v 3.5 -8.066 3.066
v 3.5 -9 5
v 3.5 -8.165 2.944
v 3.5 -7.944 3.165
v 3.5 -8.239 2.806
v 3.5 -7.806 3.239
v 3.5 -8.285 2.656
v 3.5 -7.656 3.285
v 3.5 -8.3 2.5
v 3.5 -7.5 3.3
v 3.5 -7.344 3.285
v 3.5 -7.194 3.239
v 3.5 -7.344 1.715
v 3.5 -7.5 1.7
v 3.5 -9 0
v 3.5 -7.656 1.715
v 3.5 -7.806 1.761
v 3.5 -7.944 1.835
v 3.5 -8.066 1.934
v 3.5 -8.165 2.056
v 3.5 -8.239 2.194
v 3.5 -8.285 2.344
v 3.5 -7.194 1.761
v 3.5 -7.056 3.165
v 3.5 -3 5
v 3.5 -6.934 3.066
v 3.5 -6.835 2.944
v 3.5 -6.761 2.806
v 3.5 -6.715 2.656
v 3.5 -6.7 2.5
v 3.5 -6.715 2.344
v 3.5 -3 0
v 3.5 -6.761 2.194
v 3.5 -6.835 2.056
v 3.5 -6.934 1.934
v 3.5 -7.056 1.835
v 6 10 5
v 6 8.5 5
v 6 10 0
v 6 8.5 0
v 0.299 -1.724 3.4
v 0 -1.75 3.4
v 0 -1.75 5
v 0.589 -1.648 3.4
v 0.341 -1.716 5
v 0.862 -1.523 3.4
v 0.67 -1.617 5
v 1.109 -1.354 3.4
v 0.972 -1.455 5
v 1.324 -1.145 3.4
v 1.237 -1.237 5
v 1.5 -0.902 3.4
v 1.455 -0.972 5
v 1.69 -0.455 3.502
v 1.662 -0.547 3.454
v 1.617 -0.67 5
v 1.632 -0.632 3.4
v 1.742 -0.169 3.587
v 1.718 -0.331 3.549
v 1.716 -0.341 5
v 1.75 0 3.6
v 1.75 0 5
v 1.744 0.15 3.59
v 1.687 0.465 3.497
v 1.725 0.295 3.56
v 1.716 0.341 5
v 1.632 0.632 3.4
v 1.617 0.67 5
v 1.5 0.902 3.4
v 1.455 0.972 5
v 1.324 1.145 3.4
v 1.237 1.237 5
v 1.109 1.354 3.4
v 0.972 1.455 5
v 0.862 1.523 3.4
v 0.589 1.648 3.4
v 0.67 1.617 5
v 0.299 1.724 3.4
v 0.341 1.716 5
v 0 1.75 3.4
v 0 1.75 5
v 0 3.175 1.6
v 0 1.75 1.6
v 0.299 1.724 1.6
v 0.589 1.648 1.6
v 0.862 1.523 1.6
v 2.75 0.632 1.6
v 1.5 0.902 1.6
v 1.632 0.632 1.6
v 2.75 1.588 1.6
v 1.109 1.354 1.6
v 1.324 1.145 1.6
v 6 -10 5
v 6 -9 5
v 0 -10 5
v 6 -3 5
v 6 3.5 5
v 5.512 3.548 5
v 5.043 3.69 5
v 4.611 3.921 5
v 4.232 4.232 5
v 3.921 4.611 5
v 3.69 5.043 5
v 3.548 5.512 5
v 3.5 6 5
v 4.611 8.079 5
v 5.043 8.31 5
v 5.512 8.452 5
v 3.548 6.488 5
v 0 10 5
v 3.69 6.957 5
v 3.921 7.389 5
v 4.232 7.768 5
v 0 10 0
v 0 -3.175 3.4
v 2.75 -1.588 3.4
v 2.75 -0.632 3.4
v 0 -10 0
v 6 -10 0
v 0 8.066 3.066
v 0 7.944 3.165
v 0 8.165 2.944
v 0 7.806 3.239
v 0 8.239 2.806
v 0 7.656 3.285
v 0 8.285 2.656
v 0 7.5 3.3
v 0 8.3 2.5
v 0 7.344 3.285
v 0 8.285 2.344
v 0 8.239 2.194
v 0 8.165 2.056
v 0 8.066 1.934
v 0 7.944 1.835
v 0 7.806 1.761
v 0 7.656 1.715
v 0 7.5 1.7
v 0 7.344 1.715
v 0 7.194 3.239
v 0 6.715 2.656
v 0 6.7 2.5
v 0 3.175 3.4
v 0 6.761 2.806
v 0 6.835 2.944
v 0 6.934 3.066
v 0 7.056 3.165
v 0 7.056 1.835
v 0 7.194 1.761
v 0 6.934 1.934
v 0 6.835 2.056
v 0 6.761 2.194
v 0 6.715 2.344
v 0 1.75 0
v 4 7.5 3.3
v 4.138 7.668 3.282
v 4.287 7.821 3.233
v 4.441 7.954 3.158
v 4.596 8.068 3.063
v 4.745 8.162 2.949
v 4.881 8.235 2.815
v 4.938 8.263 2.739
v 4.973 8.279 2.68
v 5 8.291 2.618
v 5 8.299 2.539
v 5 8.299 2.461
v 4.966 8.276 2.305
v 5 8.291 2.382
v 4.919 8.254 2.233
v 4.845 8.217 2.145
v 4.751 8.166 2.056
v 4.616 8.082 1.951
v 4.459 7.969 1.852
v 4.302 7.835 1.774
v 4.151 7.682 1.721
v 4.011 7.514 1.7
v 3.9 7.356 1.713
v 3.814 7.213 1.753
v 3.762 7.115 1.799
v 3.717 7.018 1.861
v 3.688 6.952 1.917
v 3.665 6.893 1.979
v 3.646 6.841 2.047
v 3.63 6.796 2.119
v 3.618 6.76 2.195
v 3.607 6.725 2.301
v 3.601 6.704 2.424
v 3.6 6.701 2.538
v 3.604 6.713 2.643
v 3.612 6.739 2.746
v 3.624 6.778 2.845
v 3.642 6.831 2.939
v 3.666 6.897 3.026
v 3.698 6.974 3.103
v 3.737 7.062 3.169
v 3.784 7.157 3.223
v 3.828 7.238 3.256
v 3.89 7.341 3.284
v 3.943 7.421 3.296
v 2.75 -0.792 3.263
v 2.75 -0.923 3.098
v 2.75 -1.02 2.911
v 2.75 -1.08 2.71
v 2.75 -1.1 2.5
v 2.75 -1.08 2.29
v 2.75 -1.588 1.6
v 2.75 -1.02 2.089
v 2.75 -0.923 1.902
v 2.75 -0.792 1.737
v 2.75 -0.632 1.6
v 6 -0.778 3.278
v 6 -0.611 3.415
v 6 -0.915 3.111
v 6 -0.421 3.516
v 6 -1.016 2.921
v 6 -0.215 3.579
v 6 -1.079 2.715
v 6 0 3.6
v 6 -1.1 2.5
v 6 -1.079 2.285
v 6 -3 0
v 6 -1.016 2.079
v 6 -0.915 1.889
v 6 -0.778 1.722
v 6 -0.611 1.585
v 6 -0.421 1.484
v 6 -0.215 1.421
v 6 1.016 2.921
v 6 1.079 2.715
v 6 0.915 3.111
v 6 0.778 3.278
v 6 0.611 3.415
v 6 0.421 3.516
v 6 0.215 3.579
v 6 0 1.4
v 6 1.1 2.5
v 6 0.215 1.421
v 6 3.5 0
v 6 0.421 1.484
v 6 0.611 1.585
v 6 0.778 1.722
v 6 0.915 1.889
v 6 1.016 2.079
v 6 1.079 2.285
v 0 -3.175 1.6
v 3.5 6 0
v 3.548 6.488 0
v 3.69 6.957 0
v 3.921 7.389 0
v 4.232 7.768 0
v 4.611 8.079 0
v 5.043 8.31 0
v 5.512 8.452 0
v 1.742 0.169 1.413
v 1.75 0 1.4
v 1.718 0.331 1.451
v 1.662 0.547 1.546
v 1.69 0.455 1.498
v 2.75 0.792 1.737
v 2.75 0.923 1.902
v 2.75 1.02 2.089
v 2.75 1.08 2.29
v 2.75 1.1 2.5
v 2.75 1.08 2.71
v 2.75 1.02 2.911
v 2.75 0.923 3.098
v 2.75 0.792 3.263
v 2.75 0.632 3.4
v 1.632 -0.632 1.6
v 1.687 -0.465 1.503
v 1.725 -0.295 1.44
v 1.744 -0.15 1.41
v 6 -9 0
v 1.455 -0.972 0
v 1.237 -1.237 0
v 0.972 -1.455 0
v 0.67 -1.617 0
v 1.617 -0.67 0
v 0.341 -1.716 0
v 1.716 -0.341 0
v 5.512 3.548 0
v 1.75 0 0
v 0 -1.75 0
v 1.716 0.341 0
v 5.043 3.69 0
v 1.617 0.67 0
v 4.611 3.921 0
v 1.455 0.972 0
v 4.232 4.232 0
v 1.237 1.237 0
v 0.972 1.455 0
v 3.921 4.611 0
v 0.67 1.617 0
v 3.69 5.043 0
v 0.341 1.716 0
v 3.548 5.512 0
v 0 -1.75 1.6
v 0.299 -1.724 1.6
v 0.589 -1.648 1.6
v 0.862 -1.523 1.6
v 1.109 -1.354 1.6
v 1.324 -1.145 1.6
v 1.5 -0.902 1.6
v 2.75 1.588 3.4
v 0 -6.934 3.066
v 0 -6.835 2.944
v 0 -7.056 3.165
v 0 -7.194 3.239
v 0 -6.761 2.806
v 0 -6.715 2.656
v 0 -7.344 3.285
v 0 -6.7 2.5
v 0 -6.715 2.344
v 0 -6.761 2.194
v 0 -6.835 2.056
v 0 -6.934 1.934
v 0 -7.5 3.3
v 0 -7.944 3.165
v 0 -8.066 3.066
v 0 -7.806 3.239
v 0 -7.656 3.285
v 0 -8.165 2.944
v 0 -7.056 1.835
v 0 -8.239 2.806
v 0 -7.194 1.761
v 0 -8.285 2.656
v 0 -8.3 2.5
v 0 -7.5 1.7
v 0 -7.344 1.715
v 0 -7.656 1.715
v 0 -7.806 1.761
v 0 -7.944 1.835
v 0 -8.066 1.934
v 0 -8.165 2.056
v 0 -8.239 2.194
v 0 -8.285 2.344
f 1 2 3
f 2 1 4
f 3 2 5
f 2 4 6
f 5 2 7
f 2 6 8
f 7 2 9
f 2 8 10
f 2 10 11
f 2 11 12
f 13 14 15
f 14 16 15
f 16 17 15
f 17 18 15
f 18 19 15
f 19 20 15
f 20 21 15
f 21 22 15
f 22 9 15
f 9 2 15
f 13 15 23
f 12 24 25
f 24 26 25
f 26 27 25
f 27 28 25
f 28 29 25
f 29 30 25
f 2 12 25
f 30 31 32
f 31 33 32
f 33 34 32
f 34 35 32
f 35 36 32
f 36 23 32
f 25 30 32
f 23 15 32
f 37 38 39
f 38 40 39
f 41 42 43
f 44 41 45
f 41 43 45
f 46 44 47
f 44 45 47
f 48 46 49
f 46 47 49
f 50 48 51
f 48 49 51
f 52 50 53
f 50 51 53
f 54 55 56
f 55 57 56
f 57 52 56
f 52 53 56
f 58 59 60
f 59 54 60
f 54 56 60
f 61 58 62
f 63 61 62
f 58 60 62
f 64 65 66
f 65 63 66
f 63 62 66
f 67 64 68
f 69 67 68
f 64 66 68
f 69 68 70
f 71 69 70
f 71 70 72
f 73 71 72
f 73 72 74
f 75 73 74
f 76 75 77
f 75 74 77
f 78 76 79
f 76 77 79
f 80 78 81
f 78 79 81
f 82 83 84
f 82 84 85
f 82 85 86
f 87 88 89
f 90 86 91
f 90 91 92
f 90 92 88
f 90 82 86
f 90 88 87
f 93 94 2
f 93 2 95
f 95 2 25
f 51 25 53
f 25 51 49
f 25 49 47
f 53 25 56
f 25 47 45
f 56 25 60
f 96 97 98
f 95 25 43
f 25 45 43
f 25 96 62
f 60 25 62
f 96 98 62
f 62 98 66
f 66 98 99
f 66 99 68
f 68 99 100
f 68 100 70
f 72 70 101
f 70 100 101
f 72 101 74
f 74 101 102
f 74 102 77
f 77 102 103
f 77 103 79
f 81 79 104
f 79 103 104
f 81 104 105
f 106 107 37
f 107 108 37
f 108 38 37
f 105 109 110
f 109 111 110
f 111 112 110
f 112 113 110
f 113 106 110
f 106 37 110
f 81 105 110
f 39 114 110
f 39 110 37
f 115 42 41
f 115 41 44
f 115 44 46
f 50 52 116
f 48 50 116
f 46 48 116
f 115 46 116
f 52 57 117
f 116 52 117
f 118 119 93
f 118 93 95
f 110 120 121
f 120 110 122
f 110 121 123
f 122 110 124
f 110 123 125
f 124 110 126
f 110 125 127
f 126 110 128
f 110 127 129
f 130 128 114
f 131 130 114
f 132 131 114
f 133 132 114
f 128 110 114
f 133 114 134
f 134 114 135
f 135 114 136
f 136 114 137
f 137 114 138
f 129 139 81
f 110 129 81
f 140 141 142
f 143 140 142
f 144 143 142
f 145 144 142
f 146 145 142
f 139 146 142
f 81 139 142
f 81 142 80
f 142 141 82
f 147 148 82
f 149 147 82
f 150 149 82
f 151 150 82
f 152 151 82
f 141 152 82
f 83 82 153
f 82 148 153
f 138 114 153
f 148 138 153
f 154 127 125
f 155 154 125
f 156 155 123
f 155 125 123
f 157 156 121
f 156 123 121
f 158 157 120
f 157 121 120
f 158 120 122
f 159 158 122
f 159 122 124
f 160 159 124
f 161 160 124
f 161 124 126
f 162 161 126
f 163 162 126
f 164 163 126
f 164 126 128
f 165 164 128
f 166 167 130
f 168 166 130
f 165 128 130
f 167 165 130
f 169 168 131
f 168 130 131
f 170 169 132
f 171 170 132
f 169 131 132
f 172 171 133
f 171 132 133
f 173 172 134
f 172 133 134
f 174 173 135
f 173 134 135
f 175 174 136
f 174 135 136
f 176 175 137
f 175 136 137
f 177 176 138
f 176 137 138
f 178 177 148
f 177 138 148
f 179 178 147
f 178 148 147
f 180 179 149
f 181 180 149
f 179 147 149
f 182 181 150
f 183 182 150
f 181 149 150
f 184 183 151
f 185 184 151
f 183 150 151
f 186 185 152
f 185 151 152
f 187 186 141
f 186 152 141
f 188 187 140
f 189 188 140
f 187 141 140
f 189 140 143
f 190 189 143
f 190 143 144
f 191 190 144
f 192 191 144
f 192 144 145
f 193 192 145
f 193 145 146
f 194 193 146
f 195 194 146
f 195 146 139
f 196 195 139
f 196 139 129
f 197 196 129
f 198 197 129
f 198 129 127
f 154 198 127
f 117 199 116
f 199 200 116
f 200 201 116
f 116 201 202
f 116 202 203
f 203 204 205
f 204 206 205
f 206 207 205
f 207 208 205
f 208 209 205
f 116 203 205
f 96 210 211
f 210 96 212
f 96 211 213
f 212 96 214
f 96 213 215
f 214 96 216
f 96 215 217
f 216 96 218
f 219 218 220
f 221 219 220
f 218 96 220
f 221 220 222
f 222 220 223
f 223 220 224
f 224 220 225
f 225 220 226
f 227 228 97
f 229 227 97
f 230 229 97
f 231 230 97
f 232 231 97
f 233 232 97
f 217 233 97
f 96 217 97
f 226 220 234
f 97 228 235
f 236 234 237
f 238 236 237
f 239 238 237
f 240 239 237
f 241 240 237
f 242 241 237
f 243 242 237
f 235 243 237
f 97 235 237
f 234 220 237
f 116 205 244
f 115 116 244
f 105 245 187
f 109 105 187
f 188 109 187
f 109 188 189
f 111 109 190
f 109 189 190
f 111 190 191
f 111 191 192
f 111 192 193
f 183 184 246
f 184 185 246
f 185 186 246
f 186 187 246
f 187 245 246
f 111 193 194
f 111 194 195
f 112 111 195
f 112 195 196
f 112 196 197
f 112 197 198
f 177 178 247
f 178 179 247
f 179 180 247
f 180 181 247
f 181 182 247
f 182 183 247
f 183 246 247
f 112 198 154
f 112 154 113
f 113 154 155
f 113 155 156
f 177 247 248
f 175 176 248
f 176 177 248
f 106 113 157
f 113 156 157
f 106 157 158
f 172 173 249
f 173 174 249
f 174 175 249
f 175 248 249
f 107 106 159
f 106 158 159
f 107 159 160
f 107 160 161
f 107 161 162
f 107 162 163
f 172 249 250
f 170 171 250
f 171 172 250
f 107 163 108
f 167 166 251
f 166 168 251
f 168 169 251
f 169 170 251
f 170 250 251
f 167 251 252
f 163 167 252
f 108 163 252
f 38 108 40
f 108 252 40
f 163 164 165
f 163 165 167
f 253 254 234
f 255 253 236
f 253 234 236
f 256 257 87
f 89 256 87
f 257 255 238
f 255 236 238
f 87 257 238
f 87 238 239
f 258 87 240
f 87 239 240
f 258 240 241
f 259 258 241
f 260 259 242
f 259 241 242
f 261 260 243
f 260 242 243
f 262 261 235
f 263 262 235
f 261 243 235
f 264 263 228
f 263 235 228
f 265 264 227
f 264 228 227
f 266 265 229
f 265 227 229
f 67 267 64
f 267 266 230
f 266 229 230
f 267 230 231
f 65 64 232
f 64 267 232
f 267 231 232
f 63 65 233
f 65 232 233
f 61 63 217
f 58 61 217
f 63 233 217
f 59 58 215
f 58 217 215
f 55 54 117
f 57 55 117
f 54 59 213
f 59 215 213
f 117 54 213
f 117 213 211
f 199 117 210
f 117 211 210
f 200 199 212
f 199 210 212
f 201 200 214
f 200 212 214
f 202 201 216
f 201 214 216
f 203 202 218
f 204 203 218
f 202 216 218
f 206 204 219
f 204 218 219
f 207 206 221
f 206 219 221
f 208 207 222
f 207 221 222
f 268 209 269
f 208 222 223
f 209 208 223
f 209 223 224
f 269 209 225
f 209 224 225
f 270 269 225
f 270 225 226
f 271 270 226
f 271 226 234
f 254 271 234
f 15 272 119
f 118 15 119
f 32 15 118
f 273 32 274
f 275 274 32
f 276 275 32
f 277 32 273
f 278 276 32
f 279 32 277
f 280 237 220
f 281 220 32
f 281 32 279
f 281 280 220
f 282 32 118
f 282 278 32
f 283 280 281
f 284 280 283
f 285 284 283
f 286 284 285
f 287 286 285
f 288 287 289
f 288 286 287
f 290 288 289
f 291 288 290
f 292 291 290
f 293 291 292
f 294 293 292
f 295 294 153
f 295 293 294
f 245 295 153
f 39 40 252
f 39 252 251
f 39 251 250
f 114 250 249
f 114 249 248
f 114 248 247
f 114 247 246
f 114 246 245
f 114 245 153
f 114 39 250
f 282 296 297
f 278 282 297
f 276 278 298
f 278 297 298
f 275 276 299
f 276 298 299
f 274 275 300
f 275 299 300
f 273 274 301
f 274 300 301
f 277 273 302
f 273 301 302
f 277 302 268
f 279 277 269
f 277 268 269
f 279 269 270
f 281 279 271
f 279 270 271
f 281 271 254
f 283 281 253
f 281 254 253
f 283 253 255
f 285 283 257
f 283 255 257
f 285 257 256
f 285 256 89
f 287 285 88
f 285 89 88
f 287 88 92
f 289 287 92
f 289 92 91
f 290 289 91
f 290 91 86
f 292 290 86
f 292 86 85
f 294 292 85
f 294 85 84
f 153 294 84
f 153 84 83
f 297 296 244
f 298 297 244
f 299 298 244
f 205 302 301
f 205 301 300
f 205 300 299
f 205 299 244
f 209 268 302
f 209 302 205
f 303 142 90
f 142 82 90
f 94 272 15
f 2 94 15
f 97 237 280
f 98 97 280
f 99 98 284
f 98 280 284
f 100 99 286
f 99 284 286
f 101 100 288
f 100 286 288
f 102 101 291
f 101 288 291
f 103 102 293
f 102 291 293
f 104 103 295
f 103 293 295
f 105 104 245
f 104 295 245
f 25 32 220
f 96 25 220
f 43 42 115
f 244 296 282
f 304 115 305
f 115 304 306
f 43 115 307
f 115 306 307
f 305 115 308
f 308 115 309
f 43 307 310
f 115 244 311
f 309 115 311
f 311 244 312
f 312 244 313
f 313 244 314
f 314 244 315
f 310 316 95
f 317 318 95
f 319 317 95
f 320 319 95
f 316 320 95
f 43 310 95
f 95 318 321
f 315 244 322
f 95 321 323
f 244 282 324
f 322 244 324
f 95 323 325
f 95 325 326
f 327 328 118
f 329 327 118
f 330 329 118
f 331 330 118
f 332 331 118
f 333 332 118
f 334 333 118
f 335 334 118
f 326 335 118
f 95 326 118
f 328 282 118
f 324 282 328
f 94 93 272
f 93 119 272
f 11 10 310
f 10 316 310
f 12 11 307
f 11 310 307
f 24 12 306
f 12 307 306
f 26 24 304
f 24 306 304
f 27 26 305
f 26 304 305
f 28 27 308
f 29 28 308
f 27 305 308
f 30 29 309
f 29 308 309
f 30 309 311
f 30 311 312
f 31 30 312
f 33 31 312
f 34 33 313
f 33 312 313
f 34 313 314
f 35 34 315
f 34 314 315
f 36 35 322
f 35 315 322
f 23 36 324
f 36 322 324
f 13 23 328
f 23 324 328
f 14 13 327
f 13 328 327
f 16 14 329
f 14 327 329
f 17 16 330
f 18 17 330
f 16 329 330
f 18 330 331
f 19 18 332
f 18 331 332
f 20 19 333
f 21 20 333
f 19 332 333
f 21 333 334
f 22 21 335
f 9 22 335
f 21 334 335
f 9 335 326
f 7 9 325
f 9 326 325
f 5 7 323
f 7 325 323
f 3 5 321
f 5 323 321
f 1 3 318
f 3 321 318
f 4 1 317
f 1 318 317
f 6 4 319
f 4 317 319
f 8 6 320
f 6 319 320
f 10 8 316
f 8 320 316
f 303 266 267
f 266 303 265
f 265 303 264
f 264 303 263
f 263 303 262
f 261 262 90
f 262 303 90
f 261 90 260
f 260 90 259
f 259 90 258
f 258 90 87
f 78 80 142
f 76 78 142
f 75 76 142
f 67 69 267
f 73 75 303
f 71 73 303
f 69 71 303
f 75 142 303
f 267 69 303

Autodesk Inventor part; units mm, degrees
ref_plane "YZ Plane" through (0, 0, 0) normal (1, 0, 0) x (0, 1, 0)
ref_plane "XZ Plane" through (0, 0, 0) normal (0, 1, 0) x (-1, 0, 0)
ref_plane "XY Plane" through (0, 0, 0) normal (0, 0, 1) x (1, 0, 0)
sketch "Sketch1" plane through (0, 0, 0) normal (0, 0, 1) x (1, 0, 0)
  line L0 (10, -10) -> (-10, -10)
  line L1 (-10, -10) -> (-10, 10)
  line L2 (-10, 10) -> (10, 10)
  line L3 (10, 10) -> (10, -10)
  line L4 (10, -10) -> (-10, 10) construction
  line L5 (-10, -10) -> (10, 10) construction
  line L6 (10, -10) -> (6, -10)
  line L7 (6, -10) -> (6, 10)
  line L8 (6, 10) -> (10, 10)
  line L9 (10, 10) -> (10, -10)
  line L10 (6, 2) -> (4, 2)
  line L11 (4, 2) -> (4, -2)
  line L12 (4, -2) -> (6, -2)
  line L13 (6, -2) -> (6, 2)
  line L14 (0, 10) -> (0, -10)
  point P0 (0, 0)
  dimension "d0" = 20
  dimension "d1" = 20
  dimension "d2" = 4
  dimension "d6" = 2
  dimension "d7" = 2
  dimension "d8" = 4
  dimension "d9" = 2
extrude "Extrusion1" add sketch "Sketch1" along normal blind 5 contours L0 L14 L2 L7 L10 L11 L12
ref_plane "Work Plane1" through (0, 0, 2.5) normal (0, 0, 1) x (1, 0, 0)
sketch "Sketch2" plane through (0, 0, 2.5) normal (0, 0, 1) x (1, 0, 0)
  line L0 (0, 10) -> (0, -10) projected
  line L1 (0, 3.1754) -> (2.75, 1.5877)
  line L2 (2.75, 1.5877) -> (2.75, -1.5877)
  line L3 (2.75, -1.5877) -> (0, -3.1754)
  line L4 (0, -3.1754) -> (-2.75, -1.5877)
  line L5 (-2.75, -1.5877) -> (-2.75, 1.5877)
  line L6 (-2.75, 1.5877) -> (0, 3.1754)
  point P0 (0, 0)
  point P1 (0, 0)
  dimension "d12" = 5.5
extrude "Extrusion2" cut sketch "Sketch2" along normal mid plane 1.8
sketch "Sketch3" plane through (0, 0, 5) normal (0, 0, 1) x (1, 0, 0)
  circle A0 centre (0, 0) radius 1.75
  dimension "d15" = 3.5
extrude "Extrusion3" cut sketch "Sketch3" against normal blind 8
sketch "Sketch4" plane through (0, 10, 0) normal (-1, 0, 0) x (0, 0, 1)
  circle A0 centre (2.5, -2.5) radius 0.8
  circle A1 centre (2.5, -17.5) radius 0.8
  line L0 (0, 0) -> (5, 0) projected
  line L1 (0, 0) -> (0, -8.25) projected
  line L2 (0, -11.75) -> (0, -20) projected
  line L3 (0, -20) -> (5, -20) projected
  point P0 (0, -10)
  dimension "d18" = 1.6
  dimension "d19" = 1.6
  dimension "d20" = 2.5
  dimension "d21" = 2.5
  dimension "d22" = 2.5
  dimension "d23" = 2.5
extrude "Extrusion4" cut sketch "Sketch4" against normal blind 5
thread "Thread1" size "M2x0.4" class "6H" standard "ANSI Metric M Profile" full length
thread "Thread2" size "M2x0.4" class "6H" standard "ANSI Metric M Profile" full length
sketch "Sketch5" plane through (0, 0, 0) normal (0, 0, -1) x (-1, 0, 0)
  line L0 (-6, -2) -> (-4, -2) projected
  line L1 (-4, -2) -> (-6, -2)
  line L2 (-6, -2) -> (-6, 2)
  line L3 (-6, 2) -> (-4, 2)
  line L4 (-4, 2) -> (-4, -2)
  point P0 (0, 0)
extrude "Extrusion5" add sketch "Sketch5" against normal blind 5
sketch "Sketch6" plane through (0, 0, 0) normal (0, 0, -1) x (-1, 0, 0)
  line L0 (-6, -10) -> (-6, 10) projected
  circle A0 centre (-6, 6) radius 2.5
  line L1 (-6, -9) -> (-3.5, -9)
  line L2 (-3.5, -9) -> (-3.5, -3)
  line L3 (-3.5, -3) -> (-6, -3)
  line L4 (-6, -3) -> (-6, -9)
  line L5 (0, -10) -> (-6, -10) projected
  line L6 (-6, 10) -> (0, 10) projected
  point P0 (0, 0)
  dimension "d32" = 2.5
  dimension "d33" = 1
  dimension "d34" = 6
  dimension "d35" = 5
  dimension "d36" = 4
extrude "Extrusion6" cut sketch "Sketch6" against normal blind 5
sketch "Sketch7" plane through (6, -3, 0) normal (1, 0, 0) x (0, 0, -1)
  circle A0 centre (-2.5, 3) radius 1.1
  line L0 (0, 0) -> (0, 6.5) projected
  line L1 (0, -7) -> (-5, -7) projected
  point P0 (0, 3)
  dimension "d39" = 2.5
  dimension "d40" = 10
  dimension "d41" = 2.2
extrude "Extrusion7" cut sketch "Sketch7" against normal blind 20
equation "\"d19\" = d18"
properties part number "POMSliderMotor"
